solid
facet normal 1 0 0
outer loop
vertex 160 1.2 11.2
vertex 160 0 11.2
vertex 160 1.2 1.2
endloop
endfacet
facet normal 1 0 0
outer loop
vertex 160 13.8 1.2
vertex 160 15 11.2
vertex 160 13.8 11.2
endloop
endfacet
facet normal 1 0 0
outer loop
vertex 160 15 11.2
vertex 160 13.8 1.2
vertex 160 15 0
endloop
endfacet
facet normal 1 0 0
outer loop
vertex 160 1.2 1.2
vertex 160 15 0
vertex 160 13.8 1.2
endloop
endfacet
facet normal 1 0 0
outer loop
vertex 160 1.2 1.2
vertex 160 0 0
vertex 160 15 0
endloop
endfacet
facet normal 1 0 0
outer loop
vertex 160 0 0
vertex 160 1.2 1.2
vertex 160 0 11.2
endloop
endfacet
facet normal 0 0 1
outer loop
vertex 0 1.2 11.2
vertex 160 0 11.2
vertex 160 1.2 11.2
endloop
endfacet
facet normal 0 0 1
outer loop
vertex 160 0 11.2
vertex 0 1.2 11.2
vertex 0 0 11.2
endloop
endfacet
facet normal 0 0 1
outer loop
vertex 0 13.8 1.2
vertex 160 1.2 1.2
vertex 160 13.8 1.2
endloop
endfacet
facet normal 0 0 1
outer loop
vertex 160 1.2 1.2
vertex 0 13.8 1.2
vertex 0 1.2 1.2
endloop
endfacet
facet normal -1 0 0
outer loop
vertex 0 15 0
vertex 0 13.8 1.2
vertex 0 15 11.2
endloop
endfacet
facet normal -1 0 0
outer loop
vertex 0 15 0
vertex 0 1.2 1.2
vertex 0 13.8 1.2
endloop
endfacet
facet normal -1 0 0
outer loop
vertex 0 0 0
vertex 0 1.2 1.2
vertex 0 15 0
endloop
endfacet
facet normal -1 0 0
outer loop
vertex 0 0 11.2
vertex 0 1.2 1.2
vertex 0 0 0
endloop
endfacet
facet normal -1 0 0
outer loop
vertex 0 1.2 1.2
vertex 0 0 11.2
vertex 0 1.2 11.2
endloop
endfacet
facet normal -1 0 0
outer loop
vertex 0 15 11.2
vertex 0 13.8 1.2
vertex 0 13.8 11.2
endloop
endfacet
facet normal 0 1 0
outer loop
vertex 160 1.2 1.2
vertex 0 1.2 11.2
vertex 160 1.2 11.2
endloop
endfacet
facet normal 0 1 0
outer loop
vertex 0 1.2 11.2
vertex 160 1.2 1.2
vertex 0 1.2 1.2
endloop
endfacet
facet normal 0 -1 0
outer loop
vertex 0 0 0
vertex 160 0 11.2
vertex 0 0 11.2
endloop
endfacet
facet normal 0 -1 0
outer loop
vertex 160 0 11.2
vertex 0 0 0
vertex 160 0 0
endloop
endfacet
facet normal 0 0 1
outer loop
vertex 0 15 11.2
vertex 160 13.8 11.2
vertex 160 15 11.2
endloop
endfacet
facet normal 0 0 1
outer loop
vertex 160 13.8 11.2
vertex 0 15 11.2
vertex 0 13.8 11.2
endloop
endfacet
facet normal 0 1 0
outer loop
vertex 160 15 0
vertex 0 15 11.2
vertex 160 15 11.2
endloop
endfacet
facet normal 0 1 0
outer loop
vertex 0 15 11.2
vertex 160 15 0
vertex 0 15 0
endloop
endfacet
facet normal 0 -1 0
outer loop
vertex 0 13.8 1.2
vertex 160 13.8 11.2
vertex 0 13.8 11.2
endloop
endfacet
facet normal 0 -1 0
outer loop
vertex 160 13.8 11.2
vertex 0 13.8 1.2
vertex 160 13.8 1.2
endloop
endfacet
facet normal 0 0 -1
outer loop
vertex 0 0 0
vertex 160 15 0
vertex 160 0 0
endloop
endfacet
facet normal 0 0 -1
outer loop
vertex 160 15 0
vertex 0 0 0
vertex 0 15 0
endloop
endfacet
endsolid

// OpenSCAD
// ScienceClaw nominal U-channel. All dimensions in millimeters.
// Clamp the first clamp_length along x. No holes or clamp reinforcement.
// Print parameters, layer orientation, material batch, and actual dimensions
// must be recorded separately; this file does not prescribe a qualified process.
length = 160;
clamp_length = 25;
base_width = 15;
wall_height = 10;
thickness = 1.2;
assert(length > clamp_length && clamp_length > 0);
assert(base_width > 2 * thickness && thickness > 0 && wall_height >= 0);
union() {
    cube([length, base_width, thickness]);
    if (wall_height > 0) {
        translate([0, 0, thickness]) cube([length, thickness, wall_height]);
        translate([0, base_width - thickness, thickness]) cube([length, thickness, wall_height]);
    }
}
